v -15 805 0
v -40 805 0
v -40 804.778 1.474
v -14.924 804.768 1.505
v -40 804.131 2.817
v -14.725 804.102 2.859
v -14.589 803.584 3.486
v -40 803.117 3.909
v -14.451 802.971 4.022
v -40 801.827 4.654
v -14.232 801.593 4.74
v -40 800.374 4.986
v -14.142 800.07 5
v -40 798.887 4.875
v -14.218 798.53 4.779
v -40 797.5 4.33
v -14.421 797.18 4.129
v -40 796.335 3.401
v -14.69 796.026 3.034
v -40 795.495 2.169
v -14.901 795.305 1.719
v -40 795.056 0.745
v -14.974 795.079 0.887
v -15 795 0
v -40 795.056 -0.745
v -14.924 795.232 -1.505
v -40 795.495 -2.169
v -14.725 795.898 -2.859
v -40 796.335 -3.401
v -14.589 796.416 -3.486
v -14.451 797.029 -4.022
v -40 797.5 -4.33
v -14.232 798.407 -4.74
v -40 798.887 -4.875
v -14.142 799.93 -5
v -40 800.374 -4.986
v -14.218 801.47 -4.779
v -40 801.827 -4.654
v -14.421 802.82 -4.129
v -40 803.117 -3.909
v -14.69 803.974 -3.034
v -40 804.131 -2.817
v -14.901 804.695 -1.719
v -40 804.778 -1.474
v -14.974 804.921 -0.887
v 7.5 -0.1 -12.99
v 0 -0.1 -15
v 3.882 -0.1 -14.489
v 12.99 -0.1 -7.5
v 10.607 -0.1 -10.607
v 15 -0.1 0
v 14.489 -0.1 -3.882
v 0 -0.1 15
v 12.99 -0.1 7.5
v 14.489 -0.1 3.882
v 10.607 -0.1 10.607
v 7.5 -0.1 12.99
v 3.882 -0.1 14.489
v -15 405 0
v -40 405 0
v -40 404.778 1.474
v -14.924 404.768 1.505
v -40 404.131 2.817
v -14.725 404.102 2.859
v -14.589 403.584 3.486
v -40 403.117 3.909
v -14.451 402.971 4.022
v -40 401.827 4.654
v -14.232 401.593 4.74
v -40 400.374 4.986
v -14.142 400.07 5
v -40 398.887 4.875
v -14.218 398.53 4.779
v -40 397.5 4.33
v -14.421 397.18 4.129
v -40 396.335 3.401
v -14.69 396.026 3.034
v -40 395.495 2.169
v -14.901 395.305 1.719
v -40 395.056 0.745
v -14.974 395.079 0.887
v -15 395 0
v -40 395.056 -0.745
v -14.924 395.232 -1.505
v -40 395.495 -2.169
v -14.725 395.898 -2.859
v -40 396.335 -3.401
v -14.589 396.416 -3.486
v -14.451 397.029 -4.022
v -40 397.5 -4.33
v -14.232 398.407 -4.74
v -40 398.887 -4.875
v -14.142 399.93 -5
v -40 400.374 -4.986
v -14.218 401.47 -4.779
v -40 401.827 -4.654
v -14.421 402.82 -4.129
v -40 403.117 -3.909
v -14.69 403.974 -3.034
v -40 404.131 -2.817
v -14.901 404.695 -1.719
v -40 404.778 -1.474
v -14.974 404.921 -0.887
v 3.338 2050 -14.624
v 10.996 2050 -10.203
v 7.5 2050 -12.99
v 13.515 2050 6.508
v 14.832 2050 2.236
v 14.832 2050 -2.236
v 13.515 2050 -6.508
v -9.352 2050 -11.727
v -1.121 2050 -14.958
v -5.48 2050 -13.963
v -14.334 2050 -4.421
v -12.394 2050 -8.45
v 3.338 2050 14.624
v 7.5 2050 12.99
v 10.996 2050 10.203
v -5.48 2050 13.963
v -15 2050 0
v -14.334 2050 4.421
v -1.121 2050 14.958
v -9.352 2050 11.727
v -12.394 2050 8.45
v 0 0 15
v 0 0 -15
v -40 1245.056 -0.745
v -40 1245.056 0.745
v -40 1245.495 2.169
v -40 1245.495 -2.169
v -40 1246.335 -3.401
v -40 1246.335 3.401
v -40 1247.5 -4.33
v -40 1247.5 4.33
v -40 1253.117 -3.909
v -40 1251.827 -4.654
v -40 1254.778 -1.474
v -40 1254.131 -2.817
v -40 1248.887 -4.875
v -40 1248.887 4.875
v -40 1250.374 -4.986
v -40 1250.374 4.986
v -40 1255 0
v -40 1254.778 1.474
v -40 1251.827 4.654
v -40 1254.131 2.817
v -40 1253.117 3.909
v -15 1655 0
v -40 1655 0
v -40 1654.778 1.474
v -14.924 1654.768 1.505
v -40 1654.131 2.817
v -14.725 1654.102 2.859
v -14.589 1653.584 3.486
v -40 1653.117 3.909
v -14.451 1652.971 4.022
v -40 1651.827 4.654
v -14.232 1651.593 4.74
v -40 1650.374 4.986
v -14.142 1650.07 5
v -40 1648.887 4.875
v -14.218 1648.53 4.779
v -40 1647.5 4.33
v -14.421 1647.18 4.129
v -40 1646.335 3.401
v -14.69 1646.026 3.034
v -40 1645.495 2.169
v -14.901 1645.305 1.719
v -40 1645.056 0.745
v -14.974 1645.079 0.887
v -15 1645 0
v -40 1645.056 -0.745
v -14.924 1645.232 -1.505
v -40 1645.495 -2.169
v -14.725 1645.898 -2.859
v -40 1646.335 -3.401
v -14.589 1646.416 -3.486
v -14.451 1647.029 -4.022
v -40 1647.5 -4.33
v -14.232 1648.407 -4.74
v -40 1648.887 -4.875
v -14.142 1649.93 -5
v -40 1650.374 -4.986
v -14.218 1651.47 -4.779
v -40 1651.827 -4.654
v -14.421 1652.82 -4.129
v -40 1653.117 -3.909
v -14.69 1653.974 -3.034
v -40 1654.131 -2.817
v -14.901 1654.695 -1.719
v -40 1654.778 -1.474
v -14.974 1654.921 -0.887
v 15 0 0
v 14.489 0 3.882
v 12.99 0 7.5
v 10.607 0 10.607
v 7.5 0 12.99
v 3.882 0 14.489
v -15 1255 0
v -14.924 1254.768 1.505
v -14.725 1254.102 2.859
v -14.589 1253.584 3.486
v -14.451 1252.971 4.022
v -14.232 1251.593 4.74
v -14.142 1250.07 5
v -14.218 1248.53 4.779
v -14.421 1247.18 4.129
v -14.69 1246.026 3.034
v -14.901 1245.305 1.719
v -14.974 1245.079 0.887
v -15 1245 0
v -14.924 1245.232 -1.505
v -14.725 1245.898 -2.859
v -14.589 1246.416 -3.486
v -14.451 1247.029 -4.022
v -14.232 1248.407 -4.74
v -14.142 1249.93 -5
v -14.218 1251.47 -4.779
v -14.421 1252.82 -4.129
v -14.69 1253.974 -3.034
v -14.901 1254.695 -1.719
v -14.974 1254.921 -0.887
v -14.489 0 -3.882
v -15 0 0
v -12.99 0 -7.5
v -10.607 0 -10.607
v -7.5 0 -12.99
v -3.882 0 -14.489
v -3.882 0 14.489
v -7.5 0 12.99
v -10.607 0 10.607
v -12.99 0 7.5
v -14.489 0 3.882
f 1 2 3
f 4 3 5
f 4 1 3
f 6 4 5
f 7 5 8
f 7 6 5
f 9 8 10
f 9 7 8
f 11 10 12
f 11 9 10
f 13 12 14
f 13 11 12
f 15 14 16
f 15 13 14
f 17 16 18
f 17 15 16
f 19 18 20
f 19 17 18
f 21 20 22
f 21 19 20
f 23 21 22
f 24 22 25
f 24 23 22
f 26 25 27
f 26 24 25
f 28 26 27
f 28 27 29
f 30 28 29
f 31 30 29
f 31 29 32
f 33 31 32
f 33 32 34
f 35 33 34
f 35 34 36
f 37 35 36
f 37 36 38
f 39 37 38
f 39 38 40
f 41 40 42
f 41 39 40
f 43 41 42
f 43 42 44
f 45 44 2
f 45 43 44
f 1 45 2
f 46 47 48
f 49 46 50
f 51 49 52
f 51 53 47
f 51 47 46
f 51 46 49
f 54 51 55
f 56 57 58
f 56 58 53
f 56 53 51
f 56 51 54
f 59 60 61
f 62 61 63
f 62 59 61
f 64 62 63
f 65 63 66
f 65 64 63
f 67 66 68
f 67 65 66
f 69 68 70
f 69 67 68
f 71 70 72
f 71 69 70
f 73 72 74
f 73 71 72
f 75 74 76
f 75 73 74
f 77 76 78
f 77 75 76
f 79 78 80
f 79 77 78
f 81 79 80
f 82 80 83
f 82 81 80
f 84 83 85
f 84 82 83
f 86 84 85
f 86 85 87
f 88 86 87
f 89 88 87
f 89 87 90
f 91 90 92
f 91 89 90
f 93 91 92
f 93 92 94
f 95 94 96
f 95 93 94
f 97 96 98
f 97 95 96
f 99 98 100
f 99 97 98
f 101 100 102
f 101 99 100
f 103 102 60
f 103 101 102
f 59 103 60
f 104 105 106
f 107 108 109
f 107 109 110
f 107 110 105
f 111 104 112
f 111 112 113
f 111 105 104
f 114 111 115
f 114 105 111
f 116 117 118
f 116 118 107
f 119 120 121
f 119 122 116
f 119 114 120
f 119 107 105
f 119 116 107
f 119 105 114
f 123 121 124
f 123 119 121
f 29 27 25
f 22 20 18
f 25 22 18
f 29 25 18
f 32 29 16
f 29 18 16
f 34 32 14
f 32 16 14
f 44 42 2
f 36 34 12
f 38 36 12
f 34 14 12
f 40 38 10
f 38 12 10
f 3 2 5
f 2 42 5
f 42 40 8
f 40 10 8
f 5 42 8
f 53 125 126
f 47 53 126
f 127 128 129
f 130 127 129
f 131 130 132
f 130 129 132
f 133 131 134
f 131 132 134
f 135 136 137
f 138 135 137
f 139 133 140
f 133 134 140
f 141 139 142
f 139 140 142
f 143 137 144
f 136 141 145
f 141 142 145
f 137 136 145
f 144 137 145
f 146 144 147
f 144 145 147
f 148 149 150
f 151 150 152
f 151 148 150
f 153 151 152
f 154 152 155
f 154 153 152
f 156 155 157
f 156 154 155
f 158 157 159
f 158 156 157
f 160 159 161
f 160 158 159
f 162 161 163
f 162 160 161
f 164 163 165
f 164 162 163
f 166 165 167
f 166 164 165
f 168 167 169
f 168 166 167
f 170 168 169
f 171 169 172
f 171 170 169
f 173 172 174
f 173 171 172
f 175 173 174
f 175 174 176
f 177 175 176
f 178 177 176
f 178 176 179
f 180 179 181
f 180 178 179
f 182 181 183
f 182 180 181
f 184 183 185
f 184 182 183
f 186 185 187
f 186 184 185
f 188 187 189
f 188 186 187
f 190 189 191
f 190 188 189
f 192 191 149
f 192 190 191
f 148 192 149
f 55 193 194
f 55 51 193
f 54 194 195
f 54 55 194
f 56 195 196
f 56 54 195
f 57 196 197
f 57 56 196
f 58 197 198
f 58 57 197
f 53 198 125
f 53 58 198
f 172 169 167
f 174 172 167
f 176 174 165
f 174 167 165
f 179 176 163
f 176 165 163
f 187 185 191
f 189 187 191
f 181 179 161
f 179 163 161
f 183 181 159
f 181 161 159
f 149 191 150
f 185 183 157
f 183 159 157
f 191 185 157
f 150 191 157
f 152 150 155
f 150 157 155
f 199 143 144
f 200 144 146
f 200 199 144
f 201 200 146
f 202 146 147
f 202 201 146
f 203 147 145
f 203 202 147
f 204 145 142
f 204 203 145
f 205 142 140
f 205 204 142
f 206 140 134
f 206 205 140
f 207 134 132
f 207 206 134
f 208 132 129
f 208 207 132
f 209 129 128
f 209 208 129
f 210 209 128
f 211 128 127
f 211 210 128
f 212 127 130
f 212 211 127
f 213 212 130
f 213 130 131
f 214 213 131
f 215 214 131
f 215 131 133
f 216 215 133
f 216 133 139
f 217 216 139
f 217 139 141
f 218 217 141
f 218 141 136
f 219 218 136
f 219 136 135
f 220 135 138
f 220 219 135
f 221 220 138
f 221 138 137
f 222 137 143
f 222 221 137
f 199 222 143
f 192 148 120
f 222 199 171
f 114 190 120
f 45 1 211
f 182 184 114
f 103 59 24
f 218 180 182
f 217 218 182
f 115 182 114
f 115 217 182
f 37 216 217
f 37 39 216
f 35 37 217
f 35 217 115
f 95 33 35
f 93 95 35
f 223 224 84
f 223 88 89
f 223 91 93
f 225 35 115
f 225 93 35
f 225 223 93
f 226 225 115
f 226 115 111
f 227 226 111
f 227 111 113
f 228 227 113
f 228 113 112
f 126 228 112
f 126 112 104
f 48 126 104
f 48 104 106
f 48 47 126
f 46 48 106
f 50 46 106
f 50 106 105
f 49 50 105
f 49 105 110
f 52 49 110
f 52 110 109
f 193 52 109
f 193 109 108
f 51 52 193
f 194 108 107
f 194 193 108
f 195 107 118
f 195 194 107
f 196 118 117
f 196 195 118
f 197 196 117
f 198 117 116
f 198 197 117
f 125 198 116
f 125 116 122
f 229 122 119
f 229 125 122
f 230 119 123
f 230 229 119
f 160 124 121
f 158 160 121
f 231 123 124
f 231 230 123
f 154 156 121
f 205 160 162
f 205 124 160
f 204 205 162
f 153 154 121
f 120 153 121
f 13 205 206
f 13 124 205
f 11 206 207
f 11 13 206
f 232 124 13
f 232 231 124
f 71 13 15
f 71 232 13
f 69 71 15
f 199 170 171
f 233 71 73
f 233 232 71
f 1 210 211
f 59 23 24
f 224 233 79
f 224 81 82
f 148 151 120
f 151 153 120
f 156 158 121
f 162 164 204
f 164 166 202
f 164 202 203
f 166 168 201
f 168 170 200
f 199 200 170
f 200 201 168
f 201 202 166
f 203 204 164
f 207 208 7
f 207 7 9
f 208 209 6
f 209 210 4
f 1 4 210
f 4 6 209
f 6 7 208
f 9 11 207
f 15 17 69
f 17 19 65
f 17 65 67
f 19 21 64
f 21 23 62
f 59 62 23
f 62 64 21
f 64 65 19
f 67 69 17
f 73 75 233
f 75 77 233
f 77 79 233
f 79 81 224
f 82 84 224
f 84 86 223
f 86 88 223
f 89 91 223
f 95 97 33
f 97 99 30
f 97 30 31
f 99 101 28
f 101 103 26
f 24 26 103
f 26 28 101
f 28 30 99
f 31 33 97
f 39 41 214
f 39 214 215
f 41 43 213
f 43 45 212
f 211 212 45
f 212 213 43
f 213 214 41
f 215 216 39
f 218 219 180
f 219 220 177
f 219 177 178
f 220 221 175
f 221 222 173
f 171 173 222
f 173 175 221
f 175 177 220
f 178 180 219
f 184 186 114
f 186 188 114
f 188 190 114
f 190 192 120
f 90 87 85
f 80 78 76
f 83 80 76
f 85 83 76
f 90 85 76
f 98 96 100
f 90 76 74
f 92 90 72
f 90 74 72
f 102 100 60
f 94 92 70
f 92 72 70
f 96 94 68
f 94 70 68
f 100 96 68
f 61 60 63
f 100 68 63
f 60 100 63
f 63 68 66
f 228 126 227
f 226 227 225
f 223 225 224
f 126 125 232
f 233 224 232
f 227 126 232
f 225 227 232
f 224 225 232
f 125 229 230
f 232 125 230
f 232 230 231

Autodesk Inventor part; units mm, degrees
ref_plane "YZ Plane" through (0, 0, 0) normal (1, 0, 0) x (0, 1, 0)
ref_plane "XZ Plane" through (0, 0, 0) normal (0, 1, 0) x (-1, 0, 0)
ref_plane "XY Plane" through (0, 0, 0) normal (0, 0, 1) x (1, 0, 0)
sketch "Sketch1" plane through (0, 0, 0) normal (0, 1, 0) x (-1, 0, 0)
  circle A0 centre (0, 0) radius 15
  dimension "d0" = 30
extrude "Extrusion1" add sketch "Sketch1" along normal blind 2050
sketch "Sketch2" plane through (0, 0, 0) normal (0, -1, 0) x (1, 0, 0)
  circle A0 centre (0, 0) radius 15 projected
  line L0 (0, 15) -> (0, -15)
extrude "Extrusion2" add sketch "Sketch2" along normal blind 0.1 contours A0 L0 picked at (3.1174, 3.9092)
sketch "Sketch4" plane through (0, 0, 0) normal (1, 0, 0) x (0, 1, 0)
  line L0 (2050, -15) -> (2050, 15) projected
  line L1 (0, 15) -> (0, -15) projected
  line L2 (0, 15) -> (-0.1, 15) projected
  line L3 (-0.1, -15) -> (-0.1, 15) projected
  line L4 (0, -15) -> (-0.1, -15) projected
  line L5 (-0.1, 15) -> (2050, 15) projected
  line L6 (-0.1, -15) -> (2050, -15) projected
  circle A0 centre (400, 0) radius 5
  circle A1 centre (800, 0) radius 5
  circle A2 centre (1250, 0) radius 5
  circle A3 centre (1650, 0) radius 5
  line L7 (1025, 15) -> (1025, -15)
  point P0 (0, 0)
  dimension "d9" = 1025
  dimension "d10" = 400
  dimension "d11" = 400
  dimension "d12" = 400
  dimension "d13" = 400
  dimension "d14" = 10
  dimension "d15" = 10
  dimension "d16" = 10
  dimension "d17" = 10
extrude "Extrusion3" add sketch "Sketch4" against normal blind 40 contours A0 | A1 | A2 | A3
properties part number "X_Rail-Rod-Rev1"
